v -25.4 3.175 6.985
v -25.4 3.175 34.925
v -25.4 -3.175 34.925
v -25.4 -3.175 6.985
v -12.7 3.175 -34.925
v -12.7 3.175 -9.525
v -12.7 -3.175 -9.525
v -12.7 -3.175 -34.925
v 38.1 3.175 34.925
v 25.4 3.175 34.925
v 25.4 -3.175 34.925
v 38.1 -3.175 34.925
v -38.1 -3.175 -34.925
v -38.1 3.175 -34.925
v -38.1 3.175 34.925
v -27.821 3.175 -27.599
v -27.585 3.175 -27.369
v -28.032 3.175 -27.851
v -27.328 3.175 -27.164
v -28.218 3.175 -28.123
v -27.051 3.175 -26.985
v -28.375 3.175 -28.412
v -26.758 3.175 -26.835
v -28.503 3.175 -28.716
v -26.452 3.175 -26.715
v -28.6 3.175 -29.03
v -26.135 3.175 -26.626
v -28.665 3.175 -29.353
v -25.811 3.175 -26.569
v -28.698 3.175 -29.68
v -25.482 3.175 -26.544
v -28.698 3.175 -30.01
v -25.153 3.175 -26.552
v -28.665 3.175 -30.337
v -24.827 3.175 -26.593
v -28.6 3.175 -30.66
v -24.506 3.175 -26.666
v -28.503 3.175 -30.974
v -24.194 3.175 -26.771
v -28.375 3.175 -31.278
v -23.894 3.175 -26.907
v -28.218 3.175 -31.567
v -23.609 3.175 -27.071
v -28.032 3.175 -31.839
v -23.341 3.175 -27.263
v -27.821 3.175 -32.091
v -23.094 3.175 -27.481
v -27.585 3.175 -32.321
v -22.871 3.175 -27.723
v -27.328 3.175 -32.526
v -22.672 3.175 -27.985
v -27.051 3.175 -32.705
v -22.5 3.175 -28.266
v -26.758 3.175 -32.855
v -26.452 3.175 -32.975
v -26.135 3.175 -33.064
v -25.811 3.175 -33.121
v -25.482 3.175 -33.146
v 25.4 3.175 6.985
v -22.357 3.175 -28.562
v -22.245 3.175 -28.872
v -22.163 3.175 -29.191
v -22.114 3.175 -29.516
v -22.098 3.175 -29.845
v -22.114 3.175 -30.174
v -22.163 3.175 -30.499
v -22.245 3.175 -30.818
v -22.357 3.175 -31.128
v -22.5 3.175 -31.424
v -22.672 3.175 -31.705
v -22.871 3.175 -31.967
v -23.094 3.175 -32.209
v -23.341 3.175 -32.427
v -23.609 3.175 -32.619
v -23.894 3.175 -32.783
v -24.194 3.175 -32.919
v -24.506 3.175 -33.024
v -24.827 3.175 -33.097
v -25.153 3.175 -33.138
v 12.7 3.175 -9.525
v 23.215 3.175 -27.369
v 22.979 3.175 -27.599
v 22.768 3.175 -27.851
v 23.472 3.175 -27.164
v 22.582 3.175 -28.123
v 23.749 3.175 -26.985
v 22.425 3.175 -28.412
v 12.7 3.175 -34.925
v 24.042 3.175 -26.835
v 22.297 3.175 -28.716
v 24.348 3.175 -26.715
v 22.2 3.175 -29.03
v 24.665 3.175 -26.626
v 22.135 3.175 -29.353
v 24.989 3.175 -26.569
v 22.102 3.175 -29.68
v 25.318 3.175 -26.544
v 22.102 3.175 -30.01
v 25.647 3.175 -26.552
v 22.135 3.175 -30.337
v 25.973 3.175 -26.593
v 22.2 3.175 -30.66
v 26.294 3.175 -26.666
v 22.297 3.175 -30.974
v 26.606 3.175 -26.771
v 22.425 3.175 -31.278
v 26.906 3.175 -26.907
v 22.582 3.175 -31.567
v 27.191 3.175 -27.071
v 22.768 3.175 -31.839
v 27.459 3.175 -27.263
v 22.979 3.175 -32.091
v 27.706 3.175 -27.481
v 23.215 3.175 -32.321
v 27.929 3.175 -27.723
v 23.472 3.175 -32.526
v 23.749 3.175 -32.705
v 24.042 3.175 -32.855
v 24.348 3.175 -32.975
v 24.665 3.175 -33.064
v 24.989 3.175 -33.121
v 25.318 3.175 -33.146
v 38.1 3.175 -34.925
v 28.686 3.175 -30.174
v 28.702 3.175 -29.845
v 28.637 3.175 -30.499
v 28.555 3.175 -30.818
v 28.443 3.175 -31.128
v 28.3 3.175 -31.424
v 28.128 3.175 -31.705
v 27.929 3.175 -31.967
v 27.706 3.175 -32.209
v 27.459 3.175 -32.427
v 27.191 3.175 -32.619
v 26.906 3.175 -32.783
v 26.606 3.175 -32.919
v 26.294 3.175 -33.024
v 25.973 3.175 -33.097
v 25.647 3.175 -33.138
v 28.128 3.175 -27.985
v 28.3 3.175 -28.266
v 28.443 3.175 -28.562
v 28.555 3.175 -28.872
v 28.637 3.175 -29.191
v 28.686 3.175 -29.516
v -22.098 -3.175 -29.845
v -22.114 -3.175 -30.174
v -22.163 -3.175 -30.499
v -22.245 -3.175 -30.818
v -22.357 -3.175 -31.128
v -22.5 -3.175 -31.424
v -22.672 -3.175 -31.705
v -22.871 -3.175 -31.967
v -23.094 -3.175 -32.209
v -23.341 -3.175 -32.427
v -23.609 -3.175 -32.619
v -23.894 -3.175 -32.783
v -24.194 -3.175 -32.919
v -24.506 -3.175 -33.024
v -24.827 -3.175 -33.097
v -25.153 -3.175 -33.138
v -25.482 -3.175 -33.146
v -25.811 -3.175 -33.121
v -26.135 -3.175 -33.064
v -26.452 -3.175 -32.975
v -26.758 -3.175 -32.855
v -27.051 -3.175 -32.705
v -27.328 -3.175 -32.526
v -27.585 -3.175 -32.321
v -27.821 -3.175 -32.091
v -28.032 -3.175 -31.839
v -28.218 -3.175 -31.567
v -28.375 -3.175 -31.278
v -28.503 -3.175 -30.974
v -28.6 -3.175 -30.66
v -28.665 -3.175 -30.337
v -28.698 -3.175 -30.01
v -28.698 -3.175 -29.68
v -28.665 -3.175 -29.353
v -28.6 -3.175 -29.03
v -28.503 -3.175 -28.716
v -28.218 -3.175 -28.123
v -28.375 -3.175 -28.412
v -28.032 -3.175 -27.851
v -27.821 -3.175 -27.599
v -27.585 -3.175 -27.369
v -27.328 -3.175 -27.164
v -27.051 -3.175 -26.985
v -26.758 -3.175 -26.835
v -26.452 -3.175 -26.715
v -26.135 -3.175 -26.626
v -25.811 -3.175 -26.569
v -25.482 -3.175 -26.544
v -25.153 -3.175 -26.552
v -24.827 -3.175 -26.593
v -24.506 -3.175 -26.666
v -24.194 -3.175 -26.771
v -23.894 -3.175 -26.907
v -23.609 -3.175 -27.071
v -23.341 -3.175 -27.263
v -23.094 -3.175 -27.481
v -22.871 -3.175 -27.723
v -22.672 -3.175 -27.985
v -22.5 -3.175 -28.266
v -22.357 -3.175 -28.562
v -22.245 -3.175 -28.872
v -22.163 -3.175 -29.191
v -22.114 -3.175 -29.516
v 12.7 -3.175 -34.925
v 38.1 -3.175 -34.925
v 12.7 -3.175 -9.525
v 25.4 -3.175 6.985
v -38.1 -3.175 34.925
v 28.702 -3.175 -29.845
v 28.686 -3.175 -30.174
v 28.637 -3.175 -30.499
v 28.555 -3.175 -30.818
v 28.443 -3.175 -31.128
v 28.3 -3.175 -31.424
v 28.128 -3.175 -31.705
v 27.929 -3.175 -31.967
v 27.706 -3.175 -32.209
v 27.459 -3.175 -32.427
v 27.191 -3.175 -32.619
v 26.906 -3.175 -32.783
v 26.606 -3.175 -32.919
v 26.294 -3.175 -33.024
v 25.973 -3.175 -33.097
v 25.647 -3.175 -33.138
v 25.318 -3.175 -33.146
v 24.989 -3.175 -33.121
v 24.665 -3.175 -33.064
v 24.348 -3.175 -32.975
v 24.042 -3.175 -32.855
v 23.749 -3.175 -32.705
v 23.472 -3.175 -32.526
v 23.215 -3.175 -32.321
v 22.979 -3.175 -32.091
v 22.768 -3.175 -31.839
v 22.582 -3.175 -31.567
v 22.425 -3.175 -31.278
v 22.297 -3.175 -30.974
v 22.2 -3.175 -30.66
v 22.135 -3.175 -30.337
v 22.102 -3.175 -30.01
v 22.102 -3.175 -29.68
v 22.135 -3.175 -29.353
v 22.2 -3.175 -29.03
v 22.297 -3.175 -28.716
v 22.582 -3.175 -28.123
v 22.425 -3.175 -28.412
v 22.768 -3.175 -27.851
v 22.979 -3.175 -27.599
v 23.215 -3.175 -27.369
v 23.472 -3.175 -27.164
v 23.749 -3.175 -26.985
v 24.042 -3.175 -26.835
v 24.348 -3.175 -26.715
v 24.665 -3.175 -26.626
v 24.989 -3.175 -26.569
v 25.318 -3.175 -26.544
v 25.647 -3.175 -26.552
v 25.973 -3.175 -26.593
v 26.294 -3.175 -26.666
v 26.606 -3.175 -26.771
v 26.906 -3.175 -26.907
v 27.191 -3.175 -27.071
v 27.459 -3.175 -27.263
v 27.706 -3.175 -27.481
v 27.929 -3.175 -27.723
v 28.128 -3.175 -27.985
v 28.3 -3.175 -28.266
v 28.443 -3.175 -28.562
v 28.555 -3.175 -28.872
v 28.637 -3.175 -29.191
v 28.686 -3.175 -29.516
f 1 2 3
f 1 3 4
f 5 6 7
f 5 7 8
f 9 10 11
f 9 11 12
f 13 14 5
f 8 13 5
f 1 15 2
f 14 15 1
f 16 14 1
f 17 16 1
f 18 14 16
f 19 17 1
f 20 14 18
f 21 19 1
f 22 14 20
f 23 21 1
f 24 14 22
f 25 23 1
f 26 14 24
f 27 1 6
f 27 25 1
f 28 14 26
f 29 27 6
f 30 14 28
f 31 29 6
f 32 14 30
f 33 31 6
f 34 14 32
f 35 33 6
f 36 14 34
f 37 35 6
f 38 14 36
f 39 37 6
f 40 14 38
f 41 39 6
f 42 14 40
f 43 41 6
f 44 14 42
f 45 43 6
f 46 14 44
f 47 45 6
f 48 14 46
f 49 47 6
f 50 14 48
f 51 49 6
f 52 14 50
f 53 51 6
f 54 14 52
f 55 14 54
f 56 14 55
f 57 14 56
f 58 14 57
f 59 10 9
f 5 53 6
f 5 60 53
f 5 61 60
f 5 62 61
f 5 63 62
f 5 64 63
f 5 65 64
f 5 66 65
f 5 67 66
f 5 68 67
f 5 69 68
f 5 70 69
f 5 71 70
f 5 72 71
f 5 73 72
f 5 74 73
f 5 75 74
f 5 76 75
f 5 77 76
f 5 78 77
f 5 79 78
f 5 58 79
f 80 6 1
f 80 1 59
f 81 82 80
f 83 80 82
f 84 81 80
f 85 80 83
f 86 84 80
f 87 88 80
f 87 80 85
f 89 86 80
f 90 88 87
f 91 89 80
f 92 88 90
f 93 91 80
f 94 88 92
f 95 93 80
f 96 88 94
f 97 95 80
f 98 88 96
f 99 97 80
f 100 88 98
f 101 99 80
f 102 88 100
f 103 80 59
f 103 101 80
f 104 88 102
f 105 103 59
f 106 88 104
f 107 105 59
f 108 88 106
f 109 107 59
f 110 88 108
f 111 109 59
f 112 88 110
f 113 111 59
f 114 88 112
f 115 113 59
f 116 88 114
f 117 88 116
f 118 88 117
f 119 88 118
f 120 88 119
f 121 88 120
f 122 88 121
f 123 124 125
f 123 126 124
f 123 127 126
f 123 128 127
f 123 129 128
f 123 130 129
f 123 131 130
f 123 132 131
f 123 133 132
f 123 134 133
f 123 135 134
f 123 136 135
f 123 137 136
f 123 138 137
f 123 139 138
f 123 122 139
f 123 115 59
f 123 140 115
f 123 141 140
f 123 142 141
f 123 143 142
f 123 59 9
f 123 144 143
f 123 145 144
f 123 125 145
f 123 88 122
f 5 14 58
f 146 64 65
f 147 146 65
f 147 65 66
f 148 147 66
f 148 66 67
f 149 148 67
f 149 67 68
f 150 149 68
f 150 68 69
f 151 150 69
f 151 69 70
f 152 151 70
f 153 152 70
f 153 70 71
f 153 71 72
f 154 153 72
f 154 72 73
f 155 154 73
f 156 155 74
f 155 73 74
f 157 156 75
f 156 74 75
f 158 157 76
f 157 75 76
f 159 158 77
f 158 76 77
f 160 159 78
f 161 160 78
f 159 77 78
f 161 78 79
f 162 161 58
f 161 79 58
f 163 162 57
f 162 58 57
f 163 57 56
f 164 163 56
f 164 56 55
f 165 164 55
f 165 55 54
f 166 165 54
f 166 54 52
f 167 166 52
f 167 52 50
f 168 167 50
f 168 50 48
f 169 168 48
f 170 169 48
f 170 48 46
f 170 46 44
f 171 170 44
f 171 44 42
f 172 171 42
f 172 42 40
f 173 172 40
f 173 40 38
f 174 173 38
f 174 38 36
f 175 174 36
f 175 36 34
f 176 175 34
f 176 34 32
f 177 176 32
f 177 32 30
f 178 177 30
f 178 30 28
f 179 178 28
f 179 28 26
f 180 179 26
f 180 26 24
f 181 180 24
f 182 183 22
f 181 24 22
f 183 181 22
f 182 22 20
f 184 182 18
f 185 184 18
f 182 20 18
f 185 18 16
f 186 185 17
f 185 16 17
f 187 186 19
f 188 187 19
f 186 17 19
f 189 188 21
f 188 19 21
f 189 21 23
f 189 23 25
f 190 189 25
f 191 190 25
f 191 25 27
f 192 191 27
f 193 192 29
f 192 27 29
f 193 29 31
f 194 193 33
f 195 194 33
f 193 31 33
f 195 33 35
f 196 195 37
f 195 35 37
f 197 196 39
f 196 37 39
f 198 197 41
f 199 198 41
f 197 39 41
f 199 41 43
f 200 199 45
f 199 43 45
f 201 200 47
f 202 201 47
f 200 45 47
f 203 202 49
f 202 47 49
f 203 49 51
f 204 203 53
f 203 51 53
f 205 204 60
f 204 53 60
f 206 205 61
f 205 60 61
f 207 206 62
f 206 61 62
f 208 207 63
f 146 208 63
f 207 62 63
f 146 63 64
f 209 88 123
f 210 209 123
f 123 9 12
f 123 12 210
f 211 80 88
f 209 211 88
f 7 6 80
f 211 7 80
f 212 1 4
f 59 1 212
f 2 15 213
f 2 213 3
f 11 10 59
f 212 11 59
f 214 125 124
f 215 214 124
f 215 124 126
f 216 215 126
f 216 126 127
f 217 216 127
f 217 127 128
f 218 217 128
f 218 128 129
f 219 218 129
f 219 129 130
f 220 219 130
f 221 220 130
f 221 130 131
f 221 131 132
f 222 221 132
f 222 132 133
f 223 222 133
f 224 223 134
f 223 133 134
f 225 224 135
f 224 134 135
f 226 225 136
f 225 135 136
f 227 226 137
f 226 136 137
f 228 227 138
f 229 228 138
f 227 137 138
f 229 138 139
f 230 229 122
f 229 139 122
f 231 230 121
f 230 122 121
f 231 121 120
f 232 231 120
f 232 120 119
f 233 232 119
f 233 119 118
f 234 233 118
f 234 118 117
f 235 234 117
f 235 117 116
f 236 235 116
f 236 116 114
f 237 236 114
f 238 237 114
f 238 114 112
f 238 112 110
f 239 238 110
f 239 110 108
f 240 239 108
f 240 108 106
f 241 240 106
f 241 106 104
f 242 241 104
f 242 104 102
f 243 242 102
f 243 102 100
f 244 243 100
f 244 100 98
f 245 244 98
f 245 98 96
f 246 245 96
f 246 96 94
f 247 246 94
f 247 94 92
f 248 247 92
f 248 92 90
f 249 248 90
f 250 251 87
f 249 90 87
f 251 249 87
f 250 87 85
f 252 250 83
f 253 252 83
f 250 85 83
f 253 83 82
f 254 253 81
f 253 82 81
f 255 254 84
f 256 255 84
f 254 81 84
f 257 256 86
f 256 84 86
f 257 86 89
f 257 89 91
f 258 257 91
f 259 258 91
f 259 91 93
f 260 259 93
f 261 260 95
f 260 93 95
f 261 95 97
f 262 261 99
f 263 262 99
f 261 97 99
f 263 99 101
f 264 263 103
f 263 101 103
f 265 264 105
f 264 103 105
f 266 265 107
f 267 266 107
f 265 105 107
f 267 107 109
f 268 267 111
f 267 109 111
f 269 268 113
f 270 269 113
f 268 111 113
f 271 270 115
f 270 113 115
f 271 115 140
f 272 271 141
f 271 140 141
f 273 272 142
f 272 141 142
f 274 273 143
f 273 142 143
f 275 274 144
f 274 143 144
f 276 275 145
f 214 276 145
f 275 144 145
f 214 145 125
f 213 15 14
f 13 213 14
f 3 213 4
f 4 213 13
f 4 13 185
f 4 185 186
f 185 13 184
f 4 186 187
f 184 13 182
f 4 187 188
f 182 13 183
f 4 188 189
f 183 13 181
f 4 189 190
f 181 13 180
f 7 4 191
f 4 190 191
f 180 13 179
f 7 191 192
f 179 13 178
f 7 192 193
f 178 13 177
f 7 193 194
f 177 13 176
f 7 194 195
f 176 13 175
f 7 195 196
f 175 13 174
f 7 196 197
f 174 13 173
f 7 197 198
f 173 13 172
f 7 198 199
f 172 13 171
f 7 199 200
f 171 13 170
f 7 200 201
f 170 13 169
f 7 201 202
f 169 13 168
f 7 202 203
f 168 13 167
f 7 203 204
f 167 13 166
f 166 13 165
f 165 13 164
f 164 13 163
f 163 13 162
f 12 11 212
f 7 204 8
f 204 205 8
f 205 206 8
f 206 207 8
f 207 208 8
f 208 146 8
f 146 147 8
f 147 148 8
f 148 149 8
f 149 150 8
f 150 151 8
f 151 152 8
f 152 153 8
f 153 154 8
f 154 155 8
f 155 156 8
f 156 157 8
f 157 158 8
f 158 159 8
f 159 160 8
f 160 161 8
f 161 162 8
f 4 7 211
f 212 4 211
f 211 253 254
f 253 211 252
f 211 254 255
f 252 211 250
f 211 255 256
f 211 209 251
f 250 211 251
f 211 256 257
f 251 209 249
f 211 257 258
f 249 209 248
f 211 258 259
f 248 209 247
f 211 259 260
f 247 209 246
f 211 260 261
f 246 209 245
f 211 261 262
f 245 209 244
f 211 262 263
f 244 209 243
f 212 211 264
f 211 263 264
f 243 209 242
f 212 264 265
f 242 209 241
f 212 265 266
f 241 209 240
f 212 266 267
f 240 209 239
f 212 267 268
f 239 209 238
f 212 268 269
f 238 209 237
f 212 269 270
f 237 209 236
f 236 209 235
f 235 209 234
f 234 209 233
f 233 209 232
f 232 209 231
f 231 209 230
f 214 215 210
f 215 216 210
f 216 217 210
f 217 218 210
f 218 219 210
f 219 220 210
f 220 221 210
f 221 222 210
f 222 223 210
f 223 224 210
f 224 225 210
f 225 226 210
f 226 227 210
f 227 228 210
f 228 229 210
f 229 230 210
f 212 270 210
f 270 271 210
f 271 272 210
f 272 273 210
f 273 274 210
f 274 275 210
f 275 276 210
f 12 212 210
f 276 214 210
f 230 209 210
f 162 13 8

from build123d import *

# Parameters (mm, degrees)
SKETCH1_W           = 76.2
SKETCH1_H           = 69.85
BOSS_EXTRUDE1_DEPTH = 3.175
SKETCH2_W           = 50.8
SKETCH2_H           = 27.94
CUT_EXTRUDE1_DEPTH  = 7.35
SKETCH4_R           = 3.302
CUT_EXTRUDE2_DEPTH  = 7.35
SKETCH5_W           = 25.4
SKETCH5_H           = 25.4
CUT_EXTRUDE3_DEPTH  = 7.35


with BuildPart() as part:
    # Sketch1 → Boss-Extrude1 (new body, symmetric)
    with BuildSketch(Plane(origin=(0, 0, 0), x_dir=(1, 0, 0), z_dir=(0, 1, 0))):
        Rectangle(SKETCH1_W, SKETCH1_H)
    extrude(amount=BOSS_EXTRUDE1_DEPTH, both=True)

    # Sketch2 → Cut-Extrude1 (cut, through all)
    with BuildSketch(Plane(origin=(0, 3.175, 0), x_dir=(1, 0, 0), z_dir=(0, 1, 0))):
        with Locations((0, -20.955)):
            Rectangle(SKETCH2_W, SKETCH2_H)
    extrude(amount=-CUT_EXTRUDE1_DEPTH, mode=Mode.SUBTRACT)

    # Sketch4 → Cut-Extrude2 (cut, through all)
    with BuildSketch(Plane(origin=(0, 3.175, 0), x_dir=(1, 0, 0), z_dir=(0, 1, 0))):
        with Locations((-25.4, 29.845)):
            Circle(SKETCH4_R)
        with Locations((25.4, 29.845)):
            Circle(SKETCH4_R)
    extrude(amount=-CUT_EXTRUDE2_DEPTH, mode=Mode.SUBTRACT)

    # Sketch5 → Cut-Extrude3 (cut, through all)
    with BuildSketch(Plane(origin=(0, 3.175, 0), x_dir=(1, 0, 0), z_dir=(0, 1, 0))):
        with Locations((0, 22.225)):
            Rectangle(SKETCH5_W, SKETCH5_H)
    extrude(amount=-CUT_EXTRUDE3_DEPTH, mode=Mode.SUBTRACT)


solid = part.part
